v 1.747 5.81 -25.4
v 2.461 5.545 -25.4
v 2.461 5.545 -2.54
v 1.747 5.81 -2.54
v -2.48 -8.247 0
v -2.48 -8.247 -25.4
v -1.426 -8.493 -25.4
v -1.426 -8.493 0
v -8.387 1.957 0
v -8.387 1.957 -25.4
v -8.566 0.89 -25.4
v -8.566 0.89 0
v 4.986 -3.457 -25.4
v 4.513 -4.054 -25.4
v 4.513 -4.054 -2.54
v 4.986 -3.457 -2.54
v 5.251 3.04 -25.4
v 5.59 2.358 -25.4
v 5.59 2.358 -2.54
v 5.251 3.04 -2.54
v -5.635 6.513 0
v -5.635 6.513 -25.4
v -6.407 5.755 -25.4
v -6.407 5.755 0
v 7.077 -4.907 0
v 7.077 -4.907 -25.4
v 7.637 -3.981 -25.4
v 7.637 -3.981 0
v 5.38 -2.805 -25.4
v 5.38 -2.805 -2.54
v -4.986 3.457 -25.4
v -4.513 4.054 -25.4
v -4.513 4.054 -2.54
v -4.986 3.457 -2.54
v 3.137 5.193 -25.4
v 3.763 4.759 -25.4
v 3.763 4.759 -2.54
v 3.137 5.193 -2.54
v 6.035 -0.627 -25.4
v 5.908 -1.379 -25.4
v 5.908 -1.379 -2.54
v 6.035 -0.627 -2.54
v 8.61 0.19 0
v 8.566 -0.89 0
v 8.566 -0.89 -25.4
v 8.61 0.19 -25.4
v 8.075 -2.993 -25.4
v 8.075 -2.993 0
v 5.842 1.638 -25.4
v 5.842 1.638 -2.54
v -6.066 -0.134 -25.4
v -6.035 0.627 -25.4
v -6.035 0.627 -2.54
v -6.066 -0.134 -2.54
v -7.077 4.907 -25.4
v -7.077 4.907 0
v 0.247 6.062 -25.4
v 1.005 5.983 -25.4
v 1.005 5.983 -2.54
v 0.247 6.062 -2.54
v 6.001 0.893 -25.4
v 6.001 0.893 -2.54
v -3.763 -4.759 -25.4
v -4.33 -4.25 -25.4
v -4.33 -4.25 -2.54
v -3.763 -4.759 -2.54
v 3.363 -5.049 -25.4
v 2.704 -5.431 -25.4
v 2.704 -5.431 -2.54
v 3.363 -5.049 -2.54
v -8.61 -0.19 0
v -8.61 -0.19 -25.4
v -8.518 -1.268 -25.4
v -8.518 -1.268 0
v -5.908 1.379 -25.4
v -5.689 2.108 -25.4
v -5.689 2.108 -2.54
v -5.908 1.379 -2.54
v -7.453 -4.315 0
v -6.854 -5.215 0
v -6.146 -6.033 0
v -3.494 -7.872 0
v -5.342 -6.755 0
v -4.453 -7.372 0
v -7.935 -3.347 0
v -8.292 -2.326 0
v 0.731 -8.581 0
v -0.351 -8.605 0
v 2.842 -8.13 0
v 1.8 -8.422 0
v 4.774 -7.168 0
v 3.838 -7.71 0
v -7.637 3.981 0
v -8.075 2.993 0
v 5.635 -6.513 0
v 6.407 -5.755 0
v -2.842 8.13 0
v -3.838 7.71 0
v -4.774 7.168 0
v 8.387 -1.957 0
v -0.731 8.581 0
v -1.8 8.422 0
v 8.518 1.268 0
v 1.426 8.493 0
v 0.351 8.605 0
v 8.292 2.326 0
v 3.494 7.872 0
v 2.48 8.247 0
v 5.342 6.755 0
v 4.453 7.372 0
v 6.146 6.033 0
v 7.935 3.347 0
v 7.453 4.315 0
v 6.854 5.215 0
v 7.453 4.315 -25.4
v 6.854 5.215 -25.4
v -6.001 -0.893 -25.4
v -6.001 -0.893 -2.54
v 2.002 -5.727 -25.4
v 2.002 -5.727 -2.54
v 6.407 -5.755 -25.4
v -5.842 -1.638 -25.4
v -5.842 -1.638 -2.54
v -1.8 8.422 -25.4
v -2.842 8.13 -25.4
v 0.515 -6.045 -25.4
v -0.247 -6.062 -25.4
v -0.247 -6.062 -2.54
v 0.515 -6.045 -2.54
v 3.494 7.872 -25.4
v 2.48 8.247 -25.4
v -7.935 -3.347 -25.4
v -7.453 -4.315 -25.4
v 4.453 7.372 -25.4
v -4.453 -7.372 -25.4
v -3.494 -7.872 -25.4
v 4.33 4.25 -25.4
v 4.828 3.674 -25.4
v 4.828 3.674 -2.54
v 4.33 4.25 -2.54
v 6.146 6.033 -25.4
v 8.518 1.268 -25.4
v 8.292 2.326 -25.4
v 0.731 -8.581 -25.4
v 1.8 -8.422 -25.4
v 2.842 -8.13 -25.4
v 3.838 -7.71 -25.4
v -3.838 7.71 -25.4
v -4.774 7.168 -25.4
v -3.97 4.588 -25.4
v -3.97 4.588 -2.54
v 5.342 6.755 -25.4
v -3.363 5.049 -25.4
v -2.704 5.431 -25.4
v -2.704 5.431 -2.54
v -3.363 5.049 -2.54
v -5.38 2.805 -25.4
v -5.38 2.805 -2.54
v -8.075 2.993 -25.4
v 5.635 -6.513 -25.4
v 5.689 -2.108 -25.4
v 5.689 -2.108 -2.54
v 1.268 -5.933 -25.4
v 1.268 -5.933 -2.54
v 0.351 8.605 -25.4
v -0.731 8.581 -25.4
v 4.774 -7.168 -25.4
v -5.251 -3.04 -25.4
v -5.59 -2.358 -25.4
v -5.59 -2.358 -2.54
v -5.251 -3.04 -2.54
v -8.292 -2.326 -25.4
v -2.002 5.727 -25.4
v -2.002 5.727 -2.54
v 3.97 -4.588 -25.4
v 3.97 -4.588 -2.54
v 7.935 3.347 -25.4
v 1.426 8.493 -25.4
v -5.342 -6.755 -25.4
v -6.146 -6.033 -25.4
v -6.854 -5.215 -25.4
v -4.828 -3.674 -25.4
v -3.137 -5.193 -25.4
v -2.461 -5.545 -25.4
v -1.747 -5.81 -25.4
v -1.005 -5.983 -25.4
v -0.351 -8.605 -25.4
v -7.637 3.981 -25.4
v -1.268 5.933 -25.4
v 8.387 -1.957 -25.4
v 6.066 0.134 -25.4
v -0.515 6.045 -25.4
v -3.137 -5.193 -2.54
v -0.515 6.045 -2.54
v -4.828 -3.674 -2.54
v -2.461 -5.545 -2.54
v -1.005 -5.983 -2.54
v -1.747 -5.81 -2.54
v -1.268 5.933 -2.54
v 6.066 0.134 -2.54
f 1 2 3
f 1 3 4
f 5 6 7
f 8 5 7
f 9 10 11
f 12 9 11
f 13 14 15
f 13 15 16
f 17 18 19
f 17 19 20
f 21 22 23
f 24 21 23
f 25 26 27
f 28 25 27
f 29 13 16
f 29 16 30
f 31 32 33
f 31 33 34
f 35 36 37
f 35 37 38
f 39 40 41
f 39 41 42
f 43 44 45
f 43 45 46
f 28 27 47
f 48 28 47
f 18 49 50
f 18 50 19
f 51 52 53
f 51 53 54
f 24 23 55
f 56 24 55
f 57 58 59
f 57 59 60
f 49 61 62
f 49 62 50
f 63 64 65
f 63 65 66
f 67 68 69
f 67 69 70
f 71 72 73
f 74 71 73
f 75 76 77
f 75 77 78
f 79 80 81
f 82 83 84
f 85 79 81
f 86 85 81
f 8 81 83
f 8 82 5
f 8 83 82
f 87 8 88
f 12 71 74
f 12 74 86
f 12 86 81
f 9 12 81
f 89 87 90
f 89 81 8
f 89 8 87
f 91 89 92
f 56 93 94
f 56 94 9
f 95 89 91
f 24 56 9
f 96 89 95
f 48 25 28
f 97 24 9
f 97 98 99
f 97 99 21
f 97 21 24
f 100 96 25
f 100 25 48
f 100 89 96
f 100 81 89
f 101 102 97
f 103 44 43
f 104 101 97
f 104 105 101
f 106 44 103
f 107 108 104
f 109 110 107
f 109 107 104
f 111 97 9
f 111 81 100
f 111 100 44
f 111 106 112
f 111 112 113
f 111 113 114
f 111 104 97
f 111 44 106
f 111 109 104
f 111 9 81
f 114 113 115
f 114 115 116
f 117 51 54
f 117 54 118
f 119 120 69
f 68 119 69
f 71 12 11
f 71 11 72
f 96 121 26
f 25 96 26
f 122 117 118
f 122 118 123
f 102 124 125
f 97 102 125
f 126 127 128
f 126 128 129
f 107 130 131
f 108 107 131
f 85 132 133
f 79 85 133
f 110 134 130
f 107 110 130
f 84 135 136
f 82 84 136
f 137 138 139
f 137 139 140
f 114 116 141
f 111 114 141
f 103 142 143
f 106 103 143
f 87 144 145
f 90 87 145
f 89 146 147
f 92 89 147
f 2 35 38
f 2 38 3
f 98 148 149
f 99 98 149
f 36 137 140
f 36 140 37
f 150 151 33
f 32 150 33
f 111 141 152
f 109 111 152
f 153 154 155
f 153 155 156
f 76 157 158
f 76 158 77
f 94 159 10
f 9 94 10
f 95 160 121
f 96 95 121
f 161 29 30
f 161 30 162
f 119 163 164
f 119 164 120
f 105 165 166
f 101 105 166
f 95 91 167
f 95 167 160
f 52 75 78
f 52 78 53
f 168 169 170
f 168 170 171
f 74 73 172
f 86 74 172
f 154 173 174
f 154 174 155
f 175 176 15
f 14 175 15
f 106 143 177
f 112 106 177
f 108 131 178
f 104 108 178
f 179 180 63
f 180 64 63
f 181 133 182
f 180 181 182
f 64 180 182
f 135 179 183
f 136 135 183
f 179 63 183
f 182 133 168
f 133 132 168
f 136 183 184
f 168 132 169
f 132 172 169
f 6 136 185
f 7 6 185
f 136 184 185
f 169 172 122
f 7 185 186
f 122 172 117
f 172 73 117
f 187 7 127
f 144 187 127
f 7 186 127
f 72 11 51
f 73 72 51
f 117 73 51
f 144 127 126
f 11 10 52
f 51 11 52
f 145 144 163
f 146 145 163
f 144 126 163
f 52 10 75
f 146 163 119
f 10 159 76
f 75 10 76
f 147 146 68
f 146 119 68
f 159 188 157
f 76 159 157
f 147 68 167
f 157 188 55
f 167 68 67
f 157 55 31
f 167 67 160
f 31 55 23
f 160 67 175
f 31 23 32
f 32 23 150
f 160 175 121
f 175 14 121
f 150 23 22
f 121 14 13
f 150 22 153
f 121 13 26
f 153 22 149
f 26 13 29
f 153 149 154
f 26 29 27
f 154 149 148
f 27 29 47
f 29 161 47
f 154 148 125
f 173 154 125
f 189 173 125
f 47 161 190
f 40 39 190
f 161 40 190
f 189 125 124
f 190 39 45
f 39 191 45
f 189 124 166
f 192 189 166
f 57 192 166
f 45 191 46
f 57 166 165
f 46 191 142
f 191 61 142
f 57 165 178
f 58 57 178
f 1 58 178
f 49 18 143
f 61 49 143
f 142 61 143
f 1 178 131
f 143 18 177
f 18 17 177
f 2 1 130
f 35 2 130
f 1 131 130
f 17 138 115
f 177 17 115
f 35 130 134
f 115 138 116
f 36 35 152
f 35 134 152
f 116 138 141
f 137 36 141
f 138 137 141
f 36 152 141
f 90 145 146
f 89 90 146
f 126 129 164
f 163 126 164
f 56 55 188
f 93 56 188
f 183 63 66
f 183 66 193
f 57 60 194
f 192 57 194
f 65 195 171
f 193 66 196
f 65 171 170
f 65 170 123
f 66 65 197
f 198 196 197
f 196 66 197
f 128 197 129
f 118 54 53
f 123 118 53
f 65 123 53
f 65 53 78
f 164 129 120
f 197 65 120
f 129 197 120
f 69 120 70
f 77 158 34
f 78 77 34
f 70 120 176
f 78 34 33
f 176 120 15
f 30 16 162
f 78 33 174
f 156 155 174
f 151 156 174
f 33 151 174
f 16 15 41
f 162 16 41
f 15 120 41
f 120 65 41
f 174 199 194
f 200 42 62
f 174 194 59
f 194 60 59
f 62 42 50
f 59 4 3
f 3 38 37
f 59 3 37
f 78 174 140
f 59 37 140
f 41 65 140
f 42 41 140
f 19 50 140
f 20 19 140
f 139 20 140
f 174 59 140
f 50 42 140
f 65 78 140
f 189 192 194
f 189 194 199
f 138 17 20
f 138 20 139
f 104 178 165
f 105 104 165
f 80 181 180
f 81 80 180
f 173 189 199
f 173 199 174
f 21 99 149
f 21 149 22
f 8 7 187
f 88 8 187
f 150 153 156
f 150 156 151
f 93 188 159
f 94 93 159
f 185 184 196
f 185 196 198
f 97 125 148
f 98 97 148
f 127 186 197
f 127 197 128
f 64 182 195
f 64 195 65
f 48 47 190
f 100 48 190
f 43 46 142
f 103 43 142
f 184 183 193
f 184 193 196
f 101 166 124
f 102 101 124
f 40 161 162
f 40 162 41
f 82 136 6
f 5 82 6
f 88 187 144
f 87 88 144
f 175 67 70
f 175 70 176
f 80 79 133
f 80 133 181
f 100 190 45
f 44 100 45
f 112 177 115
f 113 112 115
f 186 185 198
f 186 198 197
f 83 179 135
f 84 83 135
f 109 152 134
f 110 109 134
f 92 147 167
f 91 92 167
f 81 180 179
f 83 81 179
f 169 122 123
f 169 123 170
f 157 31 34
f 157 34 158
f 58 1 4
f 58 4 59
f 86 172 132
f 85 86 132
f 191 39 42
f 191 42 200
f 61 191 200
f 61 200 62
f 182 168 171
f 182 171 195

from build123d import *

# Parameters (mm, degrees)
F1_DEPTH = 25.4
F2_T     = -2.54


with BuildPart() as f1:
    # F0 (on Top) → F1 (new body)
    with BuildSketch(Plane.XY):
        Polygon((-7.453287064, -4.3146827775), (-6.853742525, -5.2148047835), (-6.1461103721, -6.0326862028), (-5.3415503872, -6.755428557), (-4.4527509618, -7.3716337674), (-3.4937289938, -7.8715839096), (-2.4796088325, -8.2473944714), (-1.4263837586, -8.4931386955), (-0.3506637608, -8.6049410489), (0.7305864139, -8.5810383416), (1.8003148046, -8.4218075336), (2.8416511552, -8.1297597898), (3.8381729697, -7.7095008777), (4.7741645036, -7.1676585313), (5.6348646113, -6.5127779281), (6.406699538, -5.7551869264), (7.0774969858, -4.906833189), (7.6366780783, -3.9810957609), (8.0754241955, -2.9925740745), (8.3868160491, -1.9568577072), (8.5659428036, -0.890280525), (8.6099795231, 0.190336913), (8.5182317221, 1.2679526241), (8.2921463183, 2.3255719649), (7.9352888136, 3.3465156466), (7.453287064, 4.3146827775), (6.853742525, 5.2148047835), (6.1461103721, 6.0326862028), (5.3415503872, 6.755428557), (4.4527509618, 7.3716337674), (3.4937289938, 7.8715839096), (2.4796088325, 8.2473944714), (1.4263837586, 8.4931386955), (0.3506637608, 8.6049410489), (-0.7305864139, 8.5810383416), (-1.8003148046, 8.4218075336), (-2.8416511552, 8.1297597898), (-3.8381729697, 7.7095008777), (-4.7741645036, 7.1676585313), (-5.6348646113, 6.5127779281), (-6.406699538, 5.7551869264), (-7.0774969858, 4.906833189), (-7.6366780783, 3.9810957609), (-8.0754241955, 2.9925740745), (-8.3868160491, 1.9568577072), (-8.5659428036, 0.890280525), (-8.6099795231, -0.190336913), (-8.5182317221, -1.2679526241), (-8.2921463183, -2.3255719649), (-7.9352888136, -3.3465156466), align=None)
    extrude(amount=F1_DEPTH)

    # F2
    f2_openings = [f1.faces().sort_by_distance(p)[0] for p in [
        (0, 0, 0),
    ]]
    offset(amount=F2_T, openings=f2_openings)


with BuildPart() as f1_1:
    # F3: moved
    add(f1.part.moved(Location((0, 0, -25.4))))


solid = f1_1.part
